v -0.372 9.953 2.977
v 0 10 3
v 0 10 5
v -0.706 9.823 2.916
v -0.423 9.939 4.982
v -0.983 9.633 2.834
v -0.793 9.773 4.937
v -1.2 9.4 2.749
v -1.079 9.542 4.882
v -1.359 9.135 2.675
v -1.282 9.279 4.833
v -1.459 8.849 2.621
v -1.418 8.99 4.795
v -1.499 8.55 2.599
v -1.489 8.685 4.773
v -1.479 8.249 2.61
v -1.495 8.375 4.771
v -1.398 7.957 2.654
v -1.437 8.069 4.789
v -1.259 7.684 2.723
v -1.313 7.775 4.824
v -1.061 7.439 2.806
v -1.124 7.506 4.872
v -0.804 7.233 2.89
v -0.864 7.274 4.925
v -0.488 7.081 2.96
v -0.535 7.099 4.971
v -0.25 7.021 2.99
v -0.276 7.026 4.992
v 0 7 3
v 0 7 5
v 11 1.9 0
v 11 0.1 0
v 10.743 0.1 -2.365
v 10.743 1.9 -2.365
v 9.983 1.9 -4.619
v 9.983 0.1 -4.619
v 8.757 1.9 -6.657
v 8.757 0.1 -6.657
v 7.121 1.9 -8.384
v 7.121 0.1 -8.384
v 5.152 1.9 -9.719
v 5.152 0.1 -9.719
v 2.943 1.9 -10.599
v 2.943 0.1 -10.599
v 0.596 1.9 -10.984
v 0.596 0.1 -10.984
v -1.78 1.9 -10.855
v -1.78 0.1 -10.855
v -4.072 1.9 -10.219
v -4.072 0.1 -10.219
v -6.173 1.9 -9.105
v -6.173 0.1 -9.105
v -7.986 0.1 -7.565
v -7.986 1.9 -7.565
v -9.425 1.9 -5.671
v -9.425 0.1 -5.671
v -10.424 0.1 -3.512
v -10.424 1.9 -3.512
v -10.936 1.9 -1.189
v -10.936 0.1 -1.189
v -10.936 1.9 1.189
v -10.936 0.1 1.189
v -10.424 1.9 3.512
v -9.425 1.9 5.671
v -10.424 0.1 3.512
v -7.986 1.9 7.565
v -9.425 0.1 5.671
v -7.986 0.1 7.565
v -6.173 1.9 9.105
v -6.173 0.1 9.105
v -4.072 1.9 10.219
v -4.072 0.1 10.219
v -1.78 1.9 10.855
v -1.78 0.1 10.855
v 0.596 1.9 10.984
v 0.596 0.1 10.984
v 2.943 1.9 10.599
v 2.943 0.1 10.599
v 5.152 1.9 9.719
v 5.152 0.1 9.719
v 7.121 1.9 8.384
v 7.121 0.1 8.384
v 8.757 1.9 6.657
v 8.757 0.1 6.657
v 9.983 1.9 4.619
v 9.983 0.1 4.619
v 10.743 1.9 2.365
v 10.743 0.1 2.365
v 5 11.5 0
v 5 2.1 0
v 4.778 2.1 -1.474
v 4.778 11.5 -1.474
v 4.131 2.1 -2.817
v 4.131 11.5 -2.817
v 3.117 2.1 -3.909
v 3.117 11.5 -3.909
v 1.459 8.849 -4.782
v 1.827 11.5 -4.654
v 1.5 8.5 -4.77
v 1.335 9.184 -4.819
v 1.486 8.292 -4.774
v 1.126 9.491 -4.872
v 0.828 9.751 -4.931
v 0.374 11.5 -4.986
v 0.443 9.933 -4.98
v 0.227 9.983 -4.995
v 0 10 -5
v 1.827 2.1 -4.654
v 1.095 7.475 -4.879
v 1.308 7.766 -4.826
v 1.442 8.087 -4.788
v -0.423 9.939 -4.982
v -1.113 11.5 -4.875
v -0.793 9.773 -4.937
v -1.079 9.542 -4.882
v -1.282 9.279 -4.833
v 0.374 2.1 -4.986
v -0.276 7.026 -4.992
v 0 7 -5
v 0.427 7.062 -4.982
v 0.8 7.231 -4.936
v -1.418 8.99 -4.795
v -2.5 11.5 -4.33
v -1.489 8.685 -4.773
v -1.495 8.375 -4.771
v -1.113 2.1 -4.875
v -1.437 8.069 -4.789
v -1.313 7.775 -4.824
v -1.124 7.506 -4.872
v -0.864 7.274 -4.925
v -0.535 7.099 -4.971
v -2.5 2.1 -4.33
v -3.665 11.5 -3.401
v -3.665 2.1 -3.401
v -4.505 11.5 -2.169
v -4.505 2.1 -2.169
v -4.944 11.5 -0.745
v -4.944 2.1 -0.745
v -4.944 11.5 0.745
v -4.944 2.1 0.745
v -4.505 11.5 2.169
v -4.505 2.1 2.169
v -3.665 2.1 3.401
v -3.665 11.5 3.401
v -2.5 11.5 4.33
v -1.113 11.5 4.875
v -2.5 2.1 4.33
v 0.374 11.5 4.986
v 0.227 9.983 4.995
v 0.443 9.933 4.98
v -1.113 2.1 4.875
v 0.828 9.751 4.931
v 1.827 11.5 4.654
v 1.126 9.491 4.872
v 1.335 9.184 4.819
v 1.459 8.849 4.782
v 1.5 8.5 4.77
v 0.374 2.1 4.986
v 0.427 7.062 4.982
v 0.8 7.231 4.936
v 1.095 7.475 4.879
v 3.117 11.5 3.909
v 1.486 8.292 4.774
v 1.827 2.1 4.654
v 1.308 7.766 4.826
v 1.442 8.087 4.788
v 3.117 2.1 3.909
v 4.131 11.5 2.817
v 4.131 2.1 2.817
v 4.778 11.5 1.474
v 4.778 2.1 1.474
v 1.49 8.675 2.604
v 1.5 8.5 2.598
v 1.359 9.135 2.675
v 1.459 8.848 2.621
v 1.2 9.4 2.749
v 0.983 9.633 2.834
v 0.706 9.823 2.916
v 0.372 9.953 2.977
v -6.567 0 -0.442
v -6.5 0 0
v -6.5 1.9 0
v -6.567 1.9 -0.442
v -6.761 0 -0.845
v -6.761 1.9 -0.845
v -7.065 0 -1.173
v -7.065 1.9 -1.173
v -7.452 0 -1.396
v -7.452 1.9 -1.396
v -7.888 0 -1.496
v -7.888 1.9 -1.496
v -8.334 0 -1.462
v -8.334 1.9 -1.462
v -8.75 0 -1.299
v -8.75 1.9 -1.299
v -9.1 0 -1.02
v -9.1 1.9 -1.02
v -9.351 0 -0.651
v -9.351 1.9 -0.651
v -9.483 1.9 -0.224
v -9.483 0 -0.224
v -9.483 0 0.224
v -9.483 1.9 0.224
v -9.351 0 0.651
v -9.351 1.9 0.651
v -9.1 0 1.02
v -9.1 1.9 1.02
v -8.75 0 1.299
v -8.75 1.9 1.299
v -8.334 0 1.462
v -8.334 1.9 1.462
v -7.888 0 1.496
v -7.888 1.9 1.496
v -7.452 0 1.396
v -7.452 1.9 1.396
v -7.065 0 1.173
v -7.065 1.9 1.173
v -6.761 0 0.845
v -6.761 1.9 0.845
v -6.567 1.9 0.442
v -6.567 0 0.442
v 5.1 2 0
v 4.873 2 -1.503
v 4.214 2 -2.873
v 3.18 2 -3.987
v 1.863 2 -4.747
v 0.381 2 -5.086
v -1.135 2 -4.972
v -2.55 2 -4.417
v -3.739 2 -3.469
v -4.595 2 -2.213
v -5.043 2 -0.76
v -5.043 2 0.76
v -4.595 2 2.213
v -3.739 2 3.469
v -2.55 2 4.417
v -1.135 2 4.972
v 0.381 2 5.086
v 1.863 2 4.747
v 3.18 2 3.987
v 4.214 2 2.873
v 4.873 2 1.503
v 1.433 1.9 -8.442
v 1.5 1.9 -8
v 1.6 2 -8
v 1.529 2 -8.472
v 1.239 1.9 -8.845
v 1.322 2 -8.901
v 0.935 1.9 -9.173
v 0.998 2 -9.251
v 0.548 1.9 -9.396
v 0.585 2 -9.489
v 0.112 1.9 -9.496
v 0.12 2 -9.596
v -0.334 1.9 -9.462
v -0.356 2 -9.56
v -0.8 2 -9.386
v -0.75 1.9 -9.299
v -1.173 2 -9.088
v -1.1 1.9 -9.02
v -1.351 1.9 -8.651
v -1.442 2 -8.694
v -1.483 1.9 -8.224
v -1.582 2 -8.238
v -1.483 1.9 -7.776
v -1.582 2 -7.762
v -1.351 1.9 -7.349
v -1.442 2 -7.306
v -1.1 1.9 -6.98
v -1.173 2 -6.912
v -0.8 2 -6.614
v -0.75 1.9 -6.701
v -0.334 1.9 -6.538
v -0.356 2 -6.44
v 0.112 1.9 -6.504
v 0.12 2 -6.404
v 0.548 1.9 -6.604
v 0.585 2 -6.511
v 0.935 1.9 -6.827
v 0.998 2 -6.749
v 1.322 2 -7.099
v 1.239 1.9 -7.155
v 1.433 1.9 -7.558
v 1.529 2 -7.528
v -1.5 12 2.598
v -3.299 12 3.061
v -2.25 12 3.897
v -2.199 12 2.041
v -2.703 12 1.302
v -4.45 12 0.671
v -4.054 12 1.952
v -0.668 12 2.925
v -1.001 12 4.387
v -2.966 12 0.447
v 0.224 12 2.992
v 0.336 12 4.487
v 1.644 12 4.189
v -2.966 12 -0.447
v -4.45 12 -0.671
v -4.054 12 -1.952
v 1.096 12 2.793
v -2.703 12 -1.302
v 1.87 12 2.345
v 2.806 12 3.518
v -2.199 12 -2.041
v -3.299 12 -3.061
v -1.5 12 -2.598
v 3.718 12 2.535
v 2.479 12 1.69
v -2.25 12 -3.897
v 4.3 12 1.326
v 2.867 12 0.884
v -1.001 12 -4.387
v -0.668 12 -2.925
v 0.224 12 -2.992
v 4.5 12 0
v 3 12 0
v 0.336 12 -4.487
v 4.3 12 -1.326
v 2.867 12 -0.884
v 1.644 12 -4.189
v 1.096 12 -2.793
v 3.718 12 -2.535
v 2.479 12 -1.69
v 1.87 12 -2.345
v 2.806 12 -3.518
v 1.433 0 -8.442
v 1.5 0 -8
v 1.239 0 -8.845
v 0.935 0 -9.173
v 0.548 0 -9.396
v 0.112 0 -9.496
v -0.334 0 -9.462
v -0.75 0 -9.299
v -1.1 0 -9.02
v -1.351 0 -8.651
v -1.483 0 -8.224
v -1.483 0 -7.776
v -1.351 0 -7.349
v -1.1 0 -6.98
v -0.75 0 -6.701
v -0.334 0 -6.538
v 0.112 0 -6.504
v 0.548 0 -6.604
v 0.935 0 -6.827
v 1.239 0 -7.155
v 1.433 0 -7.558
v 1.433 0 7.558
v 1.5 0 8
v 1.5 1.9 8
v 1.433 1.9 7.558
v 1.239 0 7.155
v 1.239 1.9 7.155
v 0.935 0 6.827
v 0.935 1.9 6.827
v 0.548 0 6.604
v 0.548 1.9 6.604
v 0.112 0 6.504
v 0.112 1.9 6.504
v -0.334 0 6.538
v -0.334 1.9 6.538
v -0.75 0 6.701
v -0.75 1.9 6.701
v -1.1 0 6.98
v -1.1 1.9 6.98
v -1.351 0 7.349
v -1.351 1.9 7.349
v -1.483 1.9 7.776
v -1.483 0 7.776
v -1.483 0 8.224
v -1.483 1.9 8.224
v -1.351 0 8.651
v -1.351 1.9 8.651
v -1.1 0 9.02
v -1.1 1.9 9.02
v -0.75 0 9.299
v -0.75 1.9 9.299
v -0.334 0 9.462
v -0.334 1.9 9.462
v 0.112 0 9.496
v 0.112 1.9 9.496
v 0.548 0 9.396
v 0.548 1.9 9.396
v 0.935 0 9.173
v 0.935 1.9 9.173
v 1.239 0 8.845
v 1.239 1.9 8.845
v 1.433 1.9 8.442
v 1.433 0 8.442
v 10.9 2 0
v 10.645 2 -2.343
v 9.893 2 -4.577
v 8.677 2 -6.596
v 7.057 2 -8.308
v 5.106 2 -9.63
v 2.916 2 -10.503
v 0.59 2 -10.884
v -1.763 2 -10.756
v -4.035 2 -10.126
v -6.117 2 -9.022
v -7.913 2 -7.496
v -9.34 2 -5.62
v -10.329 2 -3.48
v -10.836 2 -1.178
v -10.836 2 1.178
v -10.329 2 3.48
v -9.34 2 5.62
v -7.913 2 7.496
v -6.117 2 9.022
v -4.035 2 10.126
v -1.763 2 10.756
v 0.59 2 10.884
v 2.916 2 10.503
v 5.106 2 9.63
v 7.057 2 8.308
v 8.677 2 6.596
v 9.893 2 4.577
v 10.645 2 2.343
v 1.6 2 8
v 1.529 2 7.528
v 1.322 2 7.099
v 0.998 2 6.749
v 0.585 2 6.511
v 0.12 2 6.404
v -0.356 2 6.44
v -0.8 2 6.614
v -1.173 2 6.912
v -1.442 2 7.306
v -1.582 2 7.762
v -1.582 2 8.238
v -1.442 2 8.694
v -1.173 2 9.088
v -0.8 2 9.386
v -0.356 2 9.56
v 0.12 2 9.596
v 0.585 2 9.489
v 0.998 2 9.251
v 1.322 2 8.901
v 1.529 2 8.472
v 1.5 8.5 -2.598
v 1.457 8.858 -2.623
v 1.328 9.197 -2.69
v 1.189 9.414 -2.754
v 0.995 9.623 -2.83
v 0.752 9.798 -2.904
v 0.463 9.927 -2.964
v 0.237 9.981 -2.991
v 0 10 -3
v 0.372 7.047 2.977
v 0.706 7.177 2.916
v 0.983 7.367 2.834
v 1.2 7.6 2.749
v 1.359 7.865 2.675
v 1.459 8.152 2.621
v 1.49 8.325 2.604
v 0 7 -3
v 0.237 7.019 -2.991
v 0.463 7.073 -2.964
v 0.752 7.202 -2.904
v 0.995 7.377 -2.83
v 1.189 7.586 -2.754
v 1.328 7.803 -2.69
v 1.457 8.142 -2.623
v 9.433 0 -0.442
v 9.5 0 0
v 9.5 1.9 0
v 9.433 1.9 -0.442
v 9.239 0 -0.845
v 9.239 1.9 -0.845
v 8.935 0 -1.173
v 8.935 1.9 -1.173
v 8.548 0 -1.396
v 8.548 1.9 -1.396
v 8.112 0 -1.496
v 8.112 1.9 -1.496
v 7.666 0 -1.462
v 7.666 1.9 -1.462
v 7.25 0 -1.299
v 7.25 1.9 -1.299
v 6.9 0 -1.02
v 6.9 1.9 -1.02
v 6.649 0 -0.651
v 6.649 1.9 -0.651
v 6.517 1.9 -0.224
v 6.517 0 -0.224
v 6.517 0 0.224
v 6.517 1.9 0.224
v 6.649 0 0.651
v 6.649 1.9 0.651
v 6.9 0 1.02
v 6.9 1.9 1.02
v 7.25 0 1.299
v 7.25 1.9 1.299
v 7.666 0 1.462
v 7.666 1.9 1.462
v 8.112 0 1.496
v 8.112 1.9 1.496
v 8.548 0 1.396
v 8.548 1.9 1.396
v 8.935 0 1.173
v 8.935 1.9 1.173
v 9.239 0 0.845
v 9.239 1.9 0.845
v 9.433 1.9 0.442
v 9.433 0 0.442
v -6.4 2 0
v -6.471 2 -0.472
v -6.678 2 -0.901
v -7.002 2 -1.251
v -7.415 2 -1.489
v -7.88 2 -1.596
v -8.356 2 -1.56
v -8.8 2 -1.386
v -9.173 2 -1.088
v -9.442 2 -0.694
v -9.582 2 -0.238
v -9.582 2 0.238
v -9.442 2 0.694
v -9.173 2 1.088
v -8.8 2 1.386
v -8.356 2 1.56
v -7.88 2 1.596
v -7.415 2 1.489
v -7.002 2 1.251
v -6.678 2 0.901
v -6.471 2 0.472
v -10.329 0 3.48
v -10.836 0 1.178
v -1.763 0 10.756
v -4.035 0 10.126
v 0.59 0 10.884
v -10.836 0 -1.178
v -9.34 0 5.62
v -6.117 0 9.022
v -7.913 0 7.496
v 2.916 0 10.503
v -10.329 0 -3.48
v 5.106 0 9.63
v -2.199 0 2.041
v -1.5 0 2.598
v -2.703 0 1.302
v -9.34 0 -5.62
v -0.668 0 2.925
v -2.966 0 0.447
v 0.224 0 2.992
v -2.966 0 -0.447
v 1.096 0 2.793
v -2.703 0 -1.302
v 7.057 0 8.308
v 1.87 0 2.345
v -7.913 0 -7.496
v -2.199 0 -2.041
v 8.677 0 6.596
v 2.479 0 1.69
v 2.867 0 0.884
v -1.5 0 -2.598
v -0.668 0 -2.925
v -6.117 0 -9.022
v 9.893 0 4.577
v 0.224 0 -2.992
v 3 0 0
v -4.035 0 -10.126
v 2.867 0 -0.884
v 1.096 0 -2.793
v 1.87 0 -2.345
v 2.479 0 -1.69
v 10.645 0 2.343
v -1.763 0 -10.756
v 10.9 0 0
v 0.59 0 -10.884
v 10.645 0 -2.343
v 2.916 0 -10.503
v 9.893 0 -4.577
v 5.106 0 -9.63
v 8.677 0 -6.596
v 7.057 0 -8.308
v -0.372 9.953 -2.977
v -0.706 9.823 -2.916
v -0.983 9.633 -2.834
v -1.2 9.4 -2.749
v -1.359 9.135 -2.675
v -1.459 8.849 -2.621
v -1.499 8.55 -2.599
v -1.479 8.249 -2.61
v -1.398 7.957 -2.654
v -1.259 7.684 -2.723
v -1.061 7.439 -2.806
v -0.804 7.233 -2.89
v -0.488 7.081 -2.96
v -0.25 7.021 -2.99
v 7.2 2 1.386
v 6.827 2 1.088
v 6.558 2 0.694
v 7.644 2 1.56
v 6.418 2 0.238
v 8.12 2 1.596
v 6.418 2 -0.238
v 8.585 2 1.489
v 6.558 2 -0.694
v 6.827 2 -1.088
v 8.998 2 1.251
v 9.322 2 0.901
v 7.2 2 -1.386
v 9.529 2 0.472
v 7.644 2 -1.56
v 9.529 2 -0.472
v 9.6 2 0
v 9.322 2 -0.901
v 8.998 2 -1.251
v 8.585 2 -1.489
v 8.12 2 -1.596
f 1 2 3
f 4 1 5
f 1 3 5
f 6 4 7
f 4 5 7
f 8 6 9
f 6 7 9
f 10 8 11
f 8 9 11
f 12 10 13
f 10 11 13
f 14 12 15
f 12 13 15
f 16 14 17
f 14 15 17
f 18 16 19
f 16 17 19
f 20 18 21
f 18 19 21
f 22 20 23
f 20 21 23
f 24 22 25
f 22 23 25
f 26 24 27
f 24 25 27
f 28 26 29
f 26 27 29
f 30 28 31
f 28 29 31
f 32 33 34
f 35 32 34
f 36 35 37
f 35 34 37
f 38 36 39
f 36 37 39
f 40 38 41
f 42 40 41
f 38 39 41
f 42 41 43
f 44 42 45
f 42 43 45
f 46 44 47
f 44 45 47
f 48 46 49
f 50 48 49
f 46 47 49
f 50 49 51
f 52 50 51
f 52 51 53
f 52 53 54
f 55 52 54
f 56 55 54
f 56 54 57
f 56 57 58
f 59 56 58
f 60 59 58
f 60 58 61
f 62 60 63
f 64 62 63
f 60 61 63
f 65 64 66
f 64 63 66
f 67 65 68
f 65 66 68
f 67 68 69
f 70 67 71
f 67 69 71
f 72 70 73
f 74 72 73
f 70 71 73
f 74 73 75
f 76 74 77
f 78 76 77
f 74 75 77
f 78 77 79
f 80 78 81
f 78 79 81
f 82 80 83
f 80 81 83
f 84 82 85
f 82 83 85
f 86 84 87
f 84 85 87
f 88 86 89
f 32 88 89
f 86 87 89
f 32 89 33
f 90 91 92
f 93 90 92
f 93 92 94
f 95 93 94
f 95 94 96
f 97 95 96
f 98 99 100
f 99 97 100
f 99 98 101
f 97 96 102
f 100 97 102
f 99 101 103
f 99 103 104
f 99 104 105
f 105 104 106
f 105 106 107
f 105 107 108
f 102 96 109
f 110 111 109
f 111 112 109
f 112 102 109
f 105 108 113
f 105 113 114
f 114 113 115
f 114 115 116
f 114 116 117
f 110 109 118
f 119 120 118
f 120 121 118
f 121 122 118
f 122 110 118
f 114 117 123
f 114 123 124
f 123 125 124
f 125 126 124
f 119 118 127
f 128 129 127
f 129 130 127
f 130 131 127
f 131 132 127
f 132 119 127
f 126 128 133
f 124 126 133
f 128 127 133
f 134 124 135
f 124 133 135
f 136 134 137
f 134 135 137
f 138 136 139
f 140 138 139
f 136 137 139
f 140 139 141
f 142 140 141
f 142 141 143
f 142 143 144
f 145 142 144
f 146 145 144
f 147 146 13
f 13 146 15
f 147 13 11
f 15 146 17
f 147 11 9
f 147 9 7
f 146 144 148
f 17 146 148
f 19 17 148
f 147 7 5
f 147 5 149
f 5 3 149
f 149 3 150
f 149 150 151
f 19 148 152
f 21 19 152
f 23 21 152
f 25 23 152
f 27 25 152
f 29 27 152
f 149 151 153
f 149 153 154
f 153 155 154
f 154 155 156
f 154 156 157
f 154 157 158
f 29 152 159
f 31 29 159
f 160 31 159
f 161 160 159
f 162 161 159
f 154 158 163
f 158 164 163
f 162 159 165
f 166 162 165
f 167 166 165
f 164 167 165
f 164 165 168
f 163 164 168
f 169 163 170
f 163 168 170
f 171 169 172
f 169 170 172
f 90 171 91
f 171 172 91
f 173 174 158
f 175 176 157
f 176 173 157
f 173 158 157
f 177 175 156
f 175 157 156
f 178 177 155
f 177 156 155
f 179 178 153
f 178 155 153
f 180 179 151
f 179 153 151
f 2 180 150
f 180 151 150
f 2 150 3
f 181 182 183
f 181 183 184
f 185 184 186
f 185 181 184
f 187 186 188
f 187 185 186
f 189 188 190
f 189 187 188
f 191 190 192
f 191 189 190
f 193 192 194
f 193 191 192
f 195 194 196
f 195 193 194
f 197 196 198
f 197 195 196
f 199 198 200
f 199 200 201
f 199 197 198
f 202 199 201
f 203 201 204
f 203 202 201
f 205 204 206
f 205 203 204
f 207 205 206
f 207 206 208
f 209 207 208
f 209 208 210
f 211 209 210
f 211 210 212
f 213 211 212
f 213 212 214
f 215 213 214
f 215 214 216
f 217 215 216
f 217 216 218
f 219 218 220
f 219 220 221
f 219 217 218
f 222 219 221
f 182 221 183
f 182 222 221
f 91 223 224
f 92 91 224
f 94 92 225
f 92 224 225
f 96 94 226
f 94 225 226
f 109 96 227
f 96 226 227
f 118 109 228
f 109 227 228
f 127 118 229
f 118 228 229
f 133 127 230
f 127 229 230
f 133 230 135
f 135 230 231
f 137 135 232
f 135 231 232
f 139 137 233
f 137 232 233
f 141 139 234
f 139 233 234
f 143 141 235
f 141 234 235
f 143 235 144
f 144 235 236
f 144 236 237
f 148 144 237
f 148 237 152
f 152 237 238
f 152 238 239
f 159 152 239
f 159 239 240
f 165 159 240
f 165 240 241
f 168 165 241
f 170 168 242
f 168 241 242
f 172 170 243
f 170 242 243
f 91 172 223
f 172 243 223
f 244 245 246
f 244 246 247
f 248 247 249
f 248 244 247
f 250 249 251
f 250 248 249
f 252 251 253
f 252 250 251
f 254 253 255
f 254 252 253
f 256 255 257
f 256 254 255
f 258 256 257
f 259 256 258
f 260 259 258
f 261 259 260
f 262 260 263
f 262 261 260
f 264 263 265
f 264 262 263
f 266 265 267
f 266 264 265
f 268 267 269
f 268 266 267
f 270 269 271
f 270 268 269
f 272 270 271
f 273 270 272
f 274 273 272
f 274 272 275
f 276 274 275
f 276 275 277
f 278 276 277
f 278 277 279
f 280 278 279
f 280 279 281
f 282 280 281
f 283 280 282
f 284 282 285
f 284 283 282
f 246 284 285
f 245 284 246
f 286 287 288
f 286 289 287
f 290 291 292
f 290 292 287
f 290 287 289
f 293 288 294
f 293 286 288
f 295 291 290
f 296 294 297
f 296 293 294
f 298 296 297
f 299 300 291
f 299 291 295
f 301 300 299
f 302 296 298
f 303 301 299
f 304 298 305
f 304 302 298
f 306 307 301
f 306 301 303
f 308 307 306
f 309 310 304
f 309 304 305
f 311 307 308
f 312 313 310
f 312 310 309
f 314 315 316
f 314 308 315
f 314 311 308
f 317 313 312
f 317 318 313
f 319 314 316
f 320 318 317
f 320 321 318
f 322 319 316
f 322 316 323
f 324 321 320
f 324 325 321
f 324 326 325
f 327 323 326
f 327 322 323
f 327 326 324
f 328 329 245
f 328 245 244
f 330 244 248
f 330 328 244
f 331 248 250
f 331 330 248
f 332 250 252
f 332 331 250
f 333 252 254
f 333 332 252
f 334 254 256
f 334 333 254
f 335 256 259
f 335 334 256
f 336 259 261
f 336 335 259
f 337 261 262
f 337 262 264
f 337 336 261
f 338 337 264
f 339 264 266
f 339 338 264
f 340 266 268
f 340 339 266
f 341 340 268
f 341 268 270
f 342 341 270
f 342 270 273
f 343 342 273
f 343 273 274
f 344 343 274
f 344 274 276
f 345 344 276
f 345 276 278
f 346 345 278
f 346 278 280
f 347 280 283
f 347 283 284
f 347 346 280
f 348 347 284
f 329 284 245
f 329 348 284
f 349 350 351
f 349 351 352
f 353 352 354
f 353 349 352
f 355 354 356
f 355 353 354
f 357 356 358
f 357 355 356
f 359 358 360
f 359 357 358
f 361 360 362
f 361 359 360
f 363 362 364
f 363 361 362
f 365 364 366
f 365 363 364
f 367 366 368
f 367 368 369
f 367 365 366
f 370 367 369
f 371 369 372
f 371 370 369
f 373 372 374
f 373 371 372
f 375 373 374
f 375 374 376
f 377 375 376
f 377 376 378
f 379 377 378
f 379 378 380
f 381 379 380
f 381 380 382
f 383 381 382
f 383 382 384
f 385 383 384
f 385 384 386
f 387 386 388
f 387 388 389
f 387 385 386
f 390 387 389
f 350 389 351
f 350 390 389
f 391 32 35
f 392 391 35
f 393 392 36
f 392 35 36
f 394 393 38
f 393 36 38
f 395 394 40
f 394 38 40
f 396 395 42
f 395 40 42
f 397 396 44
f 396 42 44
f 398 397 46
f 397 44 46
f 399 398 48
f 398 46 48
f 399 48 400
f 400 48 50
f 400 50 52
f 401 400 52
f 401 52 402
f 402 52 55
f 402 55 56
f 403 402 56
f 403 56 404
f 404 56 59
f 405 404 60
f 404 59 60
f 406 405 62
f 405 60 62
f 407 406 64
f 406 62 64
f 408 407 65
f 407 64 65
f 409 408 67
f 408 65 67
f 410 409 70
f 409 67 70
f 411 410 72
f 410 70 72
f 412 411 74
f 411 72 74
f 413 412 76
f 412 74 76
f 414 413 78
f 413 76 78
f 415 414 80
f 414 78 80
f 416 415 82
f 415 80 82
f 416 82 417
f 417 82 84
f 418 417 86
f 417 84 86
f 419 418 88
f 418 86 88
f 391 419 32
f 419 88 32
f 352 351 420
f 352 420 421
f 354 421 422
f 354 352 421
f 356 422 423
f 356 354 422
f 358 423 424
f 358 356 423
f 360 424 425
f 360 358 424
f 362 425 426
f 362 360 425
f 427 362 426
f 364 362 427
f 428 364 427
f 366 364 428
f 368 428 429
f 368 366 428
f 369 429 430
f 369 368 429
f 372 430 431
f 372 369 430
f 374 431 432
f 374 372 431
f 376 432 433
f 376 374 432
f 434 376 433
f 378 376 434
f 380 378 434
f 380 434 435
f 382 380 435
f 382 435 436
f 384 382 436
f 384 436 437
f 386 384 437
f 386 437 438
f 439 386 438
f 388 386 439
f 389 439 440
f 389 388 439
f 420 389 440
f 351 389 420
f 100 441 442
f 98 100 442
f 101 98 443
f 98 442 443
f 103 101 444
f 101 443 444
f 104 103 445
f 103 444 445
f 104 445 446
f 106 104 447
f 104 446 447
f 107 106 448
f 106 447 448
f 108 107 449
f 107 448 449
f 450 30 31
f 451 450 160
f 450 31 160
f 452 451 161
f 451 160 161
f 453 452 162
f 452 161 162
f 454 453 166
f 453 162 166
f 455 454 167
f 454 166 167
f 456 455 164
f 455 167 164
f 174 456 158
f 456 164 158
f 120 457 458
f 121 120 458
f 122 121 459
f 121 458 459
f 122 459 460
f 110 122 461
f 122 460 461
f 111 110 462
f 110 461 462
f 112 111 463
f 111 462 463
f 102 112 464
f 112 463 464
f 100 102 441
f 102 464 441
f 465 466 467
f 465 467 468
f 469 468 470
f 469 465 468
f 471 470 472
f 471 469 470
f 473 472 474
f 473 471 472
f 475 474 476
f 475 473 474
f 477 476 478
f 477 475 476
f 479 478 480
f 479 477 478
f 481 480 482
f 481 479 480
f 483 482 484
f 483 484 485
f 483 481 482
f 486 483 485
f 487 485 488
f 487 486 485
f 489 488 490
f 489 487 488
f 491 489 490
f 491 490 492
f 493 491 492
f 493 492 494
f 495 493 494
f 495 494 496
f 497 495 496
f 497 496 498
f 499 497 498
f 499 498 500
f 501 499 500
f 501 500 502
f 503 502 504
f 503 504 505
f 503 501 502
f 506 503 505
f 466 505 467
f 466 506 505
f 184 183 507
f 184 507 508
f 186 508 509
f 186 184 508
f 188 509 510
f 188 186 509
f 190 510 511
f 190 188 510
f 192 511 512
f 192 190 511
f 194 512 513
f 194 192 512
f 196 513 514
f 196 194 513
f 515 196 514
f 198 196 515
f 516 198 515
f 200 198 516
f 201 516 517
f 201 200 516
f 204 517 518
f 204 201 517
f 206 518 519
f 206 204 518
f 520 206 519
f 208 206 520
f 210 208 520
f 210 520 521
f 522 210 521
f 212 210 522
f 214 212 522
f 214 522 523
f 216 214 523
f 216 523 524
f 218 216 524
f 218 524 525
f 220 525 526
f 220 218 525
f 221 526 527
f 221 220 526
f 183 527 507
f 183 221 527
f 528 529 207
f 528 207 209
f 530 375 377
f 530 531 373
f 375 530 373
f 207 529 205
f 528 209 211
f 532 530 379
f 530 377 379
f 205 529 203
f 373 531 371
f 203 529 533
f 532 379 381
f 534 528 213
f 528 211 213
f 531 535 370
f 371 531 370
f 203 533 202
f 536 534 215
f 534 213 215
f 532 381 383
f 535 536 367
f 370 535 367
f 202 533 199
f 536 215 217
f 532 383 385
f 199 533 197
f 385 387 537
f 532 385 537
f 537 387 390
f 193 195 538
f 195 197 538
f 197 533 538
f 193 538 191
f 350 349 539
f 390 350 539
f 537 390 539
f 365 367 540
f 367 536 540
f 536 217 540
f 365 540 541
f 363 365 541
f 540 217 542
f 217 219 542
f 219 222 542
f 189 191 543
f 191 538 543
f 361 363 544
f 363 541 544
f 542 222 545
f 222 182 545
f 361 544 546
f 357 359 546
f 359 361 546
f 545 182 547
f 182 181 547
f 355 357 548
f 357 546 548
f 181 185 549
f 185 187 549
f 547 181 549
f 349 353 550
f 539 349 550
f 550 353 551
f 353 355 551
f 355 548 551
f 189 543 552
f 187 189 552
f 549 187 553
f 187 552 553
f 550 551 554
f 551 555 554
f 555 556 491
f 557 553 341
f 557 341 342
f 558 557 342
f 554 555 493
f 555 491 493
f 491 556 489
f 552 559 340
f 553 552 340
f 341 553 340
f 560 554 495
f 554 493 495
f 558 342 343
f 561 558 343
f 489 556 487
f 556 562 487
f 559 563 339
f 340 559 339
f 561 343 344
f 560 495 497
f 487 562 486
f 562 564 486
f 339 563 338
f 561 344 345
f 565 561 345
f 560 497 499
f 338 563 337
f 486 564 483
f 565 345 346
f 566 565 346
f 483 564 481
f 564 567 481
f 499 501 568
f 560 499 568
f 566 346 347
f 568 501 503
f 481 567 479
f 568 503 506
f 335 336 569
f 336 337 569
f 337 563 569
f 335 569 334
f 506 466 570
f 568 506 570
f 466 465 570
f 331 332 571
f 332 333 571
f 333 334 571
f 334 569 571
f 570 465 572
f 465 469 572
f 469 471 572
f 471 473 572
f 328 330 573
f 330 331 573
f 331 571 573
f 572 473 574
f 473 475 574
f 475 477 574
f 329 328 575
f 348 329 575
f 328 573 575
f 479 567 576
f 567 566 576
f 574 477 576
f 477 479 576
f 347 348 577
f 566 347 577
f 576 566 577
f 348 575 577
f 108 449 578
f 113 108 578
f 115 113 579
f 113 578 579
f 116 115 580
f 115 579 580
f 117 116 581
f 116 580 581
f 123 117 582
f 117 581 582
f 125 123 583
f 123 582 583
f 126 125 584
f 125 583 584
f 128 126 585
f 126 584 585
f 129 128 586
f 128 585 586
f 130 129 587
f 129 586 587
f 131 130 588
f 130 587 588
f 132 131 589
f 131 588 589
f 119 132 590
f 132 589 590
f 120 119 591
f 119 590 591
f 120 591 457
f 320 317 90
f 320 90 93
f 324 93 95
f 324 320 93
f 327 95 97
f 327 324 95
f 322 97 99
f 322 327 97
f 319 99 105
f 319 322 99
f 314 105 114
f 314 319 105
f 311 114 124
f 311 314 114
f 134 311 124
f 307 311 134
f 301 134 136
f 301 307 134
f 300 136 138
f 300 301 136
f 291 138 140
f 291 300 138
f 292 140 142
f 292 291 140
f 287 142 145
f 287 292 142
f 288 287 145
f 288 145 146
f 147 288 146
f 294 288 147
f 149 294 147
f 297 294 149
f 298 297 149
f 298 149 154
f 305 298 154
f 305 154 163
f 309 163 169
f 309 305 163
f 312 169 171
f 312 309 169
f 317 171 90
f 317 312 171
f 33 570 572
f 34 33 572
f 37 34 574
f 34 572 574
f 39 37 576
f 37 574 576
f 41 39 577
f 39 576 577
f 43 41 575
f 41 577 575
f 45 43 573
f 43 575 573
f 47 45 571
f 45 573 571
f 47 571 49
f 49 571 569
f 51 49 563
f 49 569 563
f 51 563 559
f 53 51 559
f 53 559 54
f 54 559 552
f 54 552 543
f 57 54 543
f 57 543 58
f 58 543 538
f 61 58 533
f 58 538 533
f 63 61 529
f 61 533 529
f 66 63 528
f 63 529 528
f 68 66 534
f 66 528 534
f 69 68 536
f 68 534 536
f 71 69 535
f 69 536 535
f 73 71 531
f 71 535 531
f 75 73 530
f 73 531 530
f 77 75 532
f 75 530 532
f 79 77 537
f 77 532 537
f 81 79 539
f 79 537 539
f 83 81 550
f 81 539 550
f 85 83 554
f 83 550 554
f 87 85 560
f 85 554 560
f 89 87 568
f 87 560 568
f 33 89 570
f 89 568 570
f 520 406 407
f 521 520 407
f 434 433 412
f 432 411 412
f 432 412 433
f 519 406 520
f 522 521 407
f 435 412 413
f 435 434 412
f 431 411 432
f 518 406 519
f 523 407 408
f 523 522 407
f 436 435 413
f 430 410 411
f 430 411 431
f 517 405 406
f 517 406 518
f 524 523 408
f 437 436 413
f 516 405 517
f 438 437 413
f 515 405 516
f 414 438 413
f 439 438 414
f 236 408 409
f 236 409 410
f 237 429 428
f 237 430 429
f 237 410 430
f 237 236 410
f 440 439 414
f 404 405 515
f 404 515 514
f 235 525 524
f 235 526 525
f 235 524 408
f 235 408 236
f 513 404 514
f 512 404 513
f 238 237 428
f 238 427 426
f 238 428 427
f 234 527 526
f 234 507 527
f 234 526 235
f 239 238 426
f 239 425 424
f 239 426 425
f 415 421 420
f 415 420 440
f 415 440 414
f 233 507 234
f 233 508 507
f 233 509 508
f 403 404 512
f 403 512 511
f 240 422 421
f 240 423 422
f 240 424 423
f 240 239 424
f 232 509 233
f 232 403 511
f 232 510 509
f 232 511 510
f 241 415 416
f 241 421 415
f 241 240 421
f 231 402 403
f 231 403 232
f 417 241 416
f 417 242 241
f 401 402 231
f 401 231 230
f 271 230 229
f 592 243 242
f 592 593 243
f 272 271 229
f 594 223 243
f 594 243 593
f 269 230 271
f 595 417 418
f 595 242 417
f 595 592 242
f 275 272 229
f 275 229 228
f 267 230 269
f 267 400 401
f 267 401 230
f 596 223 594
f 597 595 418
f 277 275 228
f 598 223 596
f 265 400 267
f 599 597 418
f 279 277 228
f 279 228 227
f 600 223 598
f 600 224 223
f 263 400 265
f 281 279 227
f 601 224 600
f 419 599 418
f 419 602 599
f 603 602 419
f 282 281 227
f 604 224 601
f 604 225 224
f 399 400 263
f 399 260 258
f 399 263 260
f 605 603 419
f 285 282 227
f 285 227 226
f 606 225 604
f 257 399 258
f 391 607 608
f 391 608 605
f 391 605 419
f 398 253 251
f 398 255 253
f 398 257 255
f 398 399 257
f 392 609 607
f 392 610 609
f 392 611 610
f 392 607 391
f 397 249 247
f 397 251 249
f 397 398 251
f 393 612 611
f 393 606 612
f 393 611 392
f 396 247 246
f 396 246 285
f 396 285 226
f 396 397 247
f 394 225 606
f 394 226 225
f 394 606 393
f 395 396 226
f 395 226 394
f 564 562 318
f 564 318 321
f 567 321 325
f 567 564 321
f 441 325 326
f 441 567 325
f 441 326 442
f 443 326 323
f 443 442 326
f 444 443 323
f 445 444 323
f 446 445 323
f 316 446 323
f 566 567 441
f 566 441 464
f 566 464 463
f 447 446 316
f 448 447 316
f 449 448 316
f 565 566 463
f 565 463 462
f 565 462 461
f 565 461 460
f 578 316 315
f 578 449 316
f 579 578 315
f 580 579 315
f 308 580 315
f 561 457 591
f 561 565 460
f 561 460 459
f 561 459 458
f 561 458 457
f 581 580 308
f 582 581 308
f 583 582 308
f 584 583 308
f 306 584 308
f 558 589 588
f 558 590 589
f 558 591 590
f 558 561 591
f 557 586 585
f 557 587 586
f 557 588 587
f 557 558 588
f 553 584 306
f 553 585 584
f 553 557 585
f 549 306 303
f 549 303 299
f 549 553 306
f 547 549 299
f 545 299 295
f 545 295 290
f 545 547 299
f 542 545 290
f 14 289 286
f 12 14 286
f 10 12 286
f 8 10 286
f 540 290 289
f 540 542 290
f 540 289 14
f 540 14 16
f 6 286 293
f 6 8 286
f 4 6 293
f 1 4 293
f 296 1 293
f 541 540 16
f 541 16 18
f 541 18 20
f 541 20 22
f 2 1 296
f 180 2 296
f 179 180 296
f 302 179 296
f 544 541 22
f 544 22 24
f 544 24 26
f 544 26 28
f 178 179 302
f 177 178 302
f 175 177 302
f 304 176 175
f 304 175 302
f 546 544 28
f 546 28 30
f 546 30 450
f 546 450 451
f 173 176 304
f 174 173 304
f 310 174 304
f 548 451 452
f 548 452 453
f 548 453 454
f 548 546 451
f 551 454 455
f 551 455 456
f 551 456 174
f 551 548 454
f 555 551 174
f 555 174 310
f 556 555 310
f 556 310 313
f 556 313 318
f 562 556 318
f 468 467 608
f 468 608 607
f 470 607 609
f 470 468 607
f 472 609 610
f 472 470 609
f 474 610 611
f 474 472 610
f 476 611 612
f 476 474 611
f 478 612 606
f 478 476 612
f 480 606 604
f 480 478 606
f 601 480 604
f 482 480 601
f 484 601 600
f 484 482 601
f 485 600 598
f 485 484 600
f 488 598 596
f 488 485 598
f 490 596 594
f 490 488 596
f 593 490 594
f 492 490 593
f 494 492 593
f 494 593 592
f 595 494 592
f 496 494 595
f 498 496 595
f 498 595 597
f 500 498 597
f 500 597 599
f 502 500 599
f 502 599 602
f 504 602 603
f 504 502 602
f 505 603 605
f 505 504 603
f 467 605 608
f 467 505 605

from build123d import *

# Parameters (mm, degrees)
SKETCH1_R           = 11
SKETCH1_R_2         = 3
SKETCH1_R_3         = 1.5
BOSS_EXTRUDE1_DEPTH = 2
SKETCH2_R           = 5
SKETCH2_R_2         = 3
BOSS_EXTRUDE2_DEPTH = 10
CHAMFER1_SIZE       = 0.5
CHAMFER2_SIZE       = 0.1
CUT_EXTRUDE1_DEPTH  = 10


with BuildPart() as part:
    # Sketch1 → Boss-Extrude1 (new body)
    with BuildSketch(Plane(origin=(0, 0, 0), x_dir=(1, 0, 0), z_dir=(0, 1, 0))):
        Circle(SKETCH1_R)
        Circle(SKETCH1_R_2, mode=Mode.SUBTRACT)
        with Locations((0, 8)):
            Circle(SKETCH1_R_3, mode=Mode.SUBTRACT)
        with Locations((8, 0)):
            Circle(SKETCH1_R_3, mode=Mode.SUBTRACT)
        with Locations((0, -8)):
            Circle(SKETCH1_R_3, mode=Mode.SUBTRACT)
        with Locations((-8, 0)):
            Circle(SKETCH1_R_3, mode=Mode.SUBTRACT)
    extrude(amount=BOSS_EXTRUDE1_DEPTH)

    # Sketch2 → Boss-Extrude2 (add)
    with BuildSketch(Plane(origin=(0, 2, 0), x_dir=(1, 0, 0), z_dir=(0, 1, 0))):
        Circle(SKETCH2_R)
        Circle(SKETCH2_R_2, mode=Mode.SUBTRACT)
    extrude(amount=BOSS_EXTRUDE2_DEPTH)

    # Chamfer1
    chamfer1_edges = [part.edges().sort_by_distance(p)[0] for p in [
        (-5, 12, 0),
    ]]
    chamfer(chamfer1_edges, length=CHAMFER1_SIZE)

    # Chamfer2
    chamfer2_edges = [part.edges().sort_by_distance(p)[0] for p in [
        (-1.5, 2, -8),
        (-1.5, 2, 8),
        (-5, 2, 0),
        (-9.5, 2, 0),
        (6.5, 2, 0),
        (-11, 2, 0),
        (-11, 0, 0),
    ]]
    chamfer(chamfer2_edges, length=CHAMFER2_SIZE)

    # Sketch3 → Cut-Extrude1 (cut)
    with BuildSketch(Plane.XY.offset(5)):
        with BuildLine():
            ThreePointArc((0, 10), (-1.5, 8.5), (0, 7))
            Line((0, 7), (0, 10))
        make_face()
        with BuildLine():
            Line((0, 10), (0, 7))
            ThreePointArc((0, 7), (1.060660172, 7.439339828), (1.5, 8.5))
            ThreePointArc((1.5, 8.5), (1.060660172, 9.560660172), (0, 10))
        make_face()
    extrude(amount=-CUT_EXTRUDE1_DEPTH, mode=Mode.SUBTRACT)


solid = part.part
